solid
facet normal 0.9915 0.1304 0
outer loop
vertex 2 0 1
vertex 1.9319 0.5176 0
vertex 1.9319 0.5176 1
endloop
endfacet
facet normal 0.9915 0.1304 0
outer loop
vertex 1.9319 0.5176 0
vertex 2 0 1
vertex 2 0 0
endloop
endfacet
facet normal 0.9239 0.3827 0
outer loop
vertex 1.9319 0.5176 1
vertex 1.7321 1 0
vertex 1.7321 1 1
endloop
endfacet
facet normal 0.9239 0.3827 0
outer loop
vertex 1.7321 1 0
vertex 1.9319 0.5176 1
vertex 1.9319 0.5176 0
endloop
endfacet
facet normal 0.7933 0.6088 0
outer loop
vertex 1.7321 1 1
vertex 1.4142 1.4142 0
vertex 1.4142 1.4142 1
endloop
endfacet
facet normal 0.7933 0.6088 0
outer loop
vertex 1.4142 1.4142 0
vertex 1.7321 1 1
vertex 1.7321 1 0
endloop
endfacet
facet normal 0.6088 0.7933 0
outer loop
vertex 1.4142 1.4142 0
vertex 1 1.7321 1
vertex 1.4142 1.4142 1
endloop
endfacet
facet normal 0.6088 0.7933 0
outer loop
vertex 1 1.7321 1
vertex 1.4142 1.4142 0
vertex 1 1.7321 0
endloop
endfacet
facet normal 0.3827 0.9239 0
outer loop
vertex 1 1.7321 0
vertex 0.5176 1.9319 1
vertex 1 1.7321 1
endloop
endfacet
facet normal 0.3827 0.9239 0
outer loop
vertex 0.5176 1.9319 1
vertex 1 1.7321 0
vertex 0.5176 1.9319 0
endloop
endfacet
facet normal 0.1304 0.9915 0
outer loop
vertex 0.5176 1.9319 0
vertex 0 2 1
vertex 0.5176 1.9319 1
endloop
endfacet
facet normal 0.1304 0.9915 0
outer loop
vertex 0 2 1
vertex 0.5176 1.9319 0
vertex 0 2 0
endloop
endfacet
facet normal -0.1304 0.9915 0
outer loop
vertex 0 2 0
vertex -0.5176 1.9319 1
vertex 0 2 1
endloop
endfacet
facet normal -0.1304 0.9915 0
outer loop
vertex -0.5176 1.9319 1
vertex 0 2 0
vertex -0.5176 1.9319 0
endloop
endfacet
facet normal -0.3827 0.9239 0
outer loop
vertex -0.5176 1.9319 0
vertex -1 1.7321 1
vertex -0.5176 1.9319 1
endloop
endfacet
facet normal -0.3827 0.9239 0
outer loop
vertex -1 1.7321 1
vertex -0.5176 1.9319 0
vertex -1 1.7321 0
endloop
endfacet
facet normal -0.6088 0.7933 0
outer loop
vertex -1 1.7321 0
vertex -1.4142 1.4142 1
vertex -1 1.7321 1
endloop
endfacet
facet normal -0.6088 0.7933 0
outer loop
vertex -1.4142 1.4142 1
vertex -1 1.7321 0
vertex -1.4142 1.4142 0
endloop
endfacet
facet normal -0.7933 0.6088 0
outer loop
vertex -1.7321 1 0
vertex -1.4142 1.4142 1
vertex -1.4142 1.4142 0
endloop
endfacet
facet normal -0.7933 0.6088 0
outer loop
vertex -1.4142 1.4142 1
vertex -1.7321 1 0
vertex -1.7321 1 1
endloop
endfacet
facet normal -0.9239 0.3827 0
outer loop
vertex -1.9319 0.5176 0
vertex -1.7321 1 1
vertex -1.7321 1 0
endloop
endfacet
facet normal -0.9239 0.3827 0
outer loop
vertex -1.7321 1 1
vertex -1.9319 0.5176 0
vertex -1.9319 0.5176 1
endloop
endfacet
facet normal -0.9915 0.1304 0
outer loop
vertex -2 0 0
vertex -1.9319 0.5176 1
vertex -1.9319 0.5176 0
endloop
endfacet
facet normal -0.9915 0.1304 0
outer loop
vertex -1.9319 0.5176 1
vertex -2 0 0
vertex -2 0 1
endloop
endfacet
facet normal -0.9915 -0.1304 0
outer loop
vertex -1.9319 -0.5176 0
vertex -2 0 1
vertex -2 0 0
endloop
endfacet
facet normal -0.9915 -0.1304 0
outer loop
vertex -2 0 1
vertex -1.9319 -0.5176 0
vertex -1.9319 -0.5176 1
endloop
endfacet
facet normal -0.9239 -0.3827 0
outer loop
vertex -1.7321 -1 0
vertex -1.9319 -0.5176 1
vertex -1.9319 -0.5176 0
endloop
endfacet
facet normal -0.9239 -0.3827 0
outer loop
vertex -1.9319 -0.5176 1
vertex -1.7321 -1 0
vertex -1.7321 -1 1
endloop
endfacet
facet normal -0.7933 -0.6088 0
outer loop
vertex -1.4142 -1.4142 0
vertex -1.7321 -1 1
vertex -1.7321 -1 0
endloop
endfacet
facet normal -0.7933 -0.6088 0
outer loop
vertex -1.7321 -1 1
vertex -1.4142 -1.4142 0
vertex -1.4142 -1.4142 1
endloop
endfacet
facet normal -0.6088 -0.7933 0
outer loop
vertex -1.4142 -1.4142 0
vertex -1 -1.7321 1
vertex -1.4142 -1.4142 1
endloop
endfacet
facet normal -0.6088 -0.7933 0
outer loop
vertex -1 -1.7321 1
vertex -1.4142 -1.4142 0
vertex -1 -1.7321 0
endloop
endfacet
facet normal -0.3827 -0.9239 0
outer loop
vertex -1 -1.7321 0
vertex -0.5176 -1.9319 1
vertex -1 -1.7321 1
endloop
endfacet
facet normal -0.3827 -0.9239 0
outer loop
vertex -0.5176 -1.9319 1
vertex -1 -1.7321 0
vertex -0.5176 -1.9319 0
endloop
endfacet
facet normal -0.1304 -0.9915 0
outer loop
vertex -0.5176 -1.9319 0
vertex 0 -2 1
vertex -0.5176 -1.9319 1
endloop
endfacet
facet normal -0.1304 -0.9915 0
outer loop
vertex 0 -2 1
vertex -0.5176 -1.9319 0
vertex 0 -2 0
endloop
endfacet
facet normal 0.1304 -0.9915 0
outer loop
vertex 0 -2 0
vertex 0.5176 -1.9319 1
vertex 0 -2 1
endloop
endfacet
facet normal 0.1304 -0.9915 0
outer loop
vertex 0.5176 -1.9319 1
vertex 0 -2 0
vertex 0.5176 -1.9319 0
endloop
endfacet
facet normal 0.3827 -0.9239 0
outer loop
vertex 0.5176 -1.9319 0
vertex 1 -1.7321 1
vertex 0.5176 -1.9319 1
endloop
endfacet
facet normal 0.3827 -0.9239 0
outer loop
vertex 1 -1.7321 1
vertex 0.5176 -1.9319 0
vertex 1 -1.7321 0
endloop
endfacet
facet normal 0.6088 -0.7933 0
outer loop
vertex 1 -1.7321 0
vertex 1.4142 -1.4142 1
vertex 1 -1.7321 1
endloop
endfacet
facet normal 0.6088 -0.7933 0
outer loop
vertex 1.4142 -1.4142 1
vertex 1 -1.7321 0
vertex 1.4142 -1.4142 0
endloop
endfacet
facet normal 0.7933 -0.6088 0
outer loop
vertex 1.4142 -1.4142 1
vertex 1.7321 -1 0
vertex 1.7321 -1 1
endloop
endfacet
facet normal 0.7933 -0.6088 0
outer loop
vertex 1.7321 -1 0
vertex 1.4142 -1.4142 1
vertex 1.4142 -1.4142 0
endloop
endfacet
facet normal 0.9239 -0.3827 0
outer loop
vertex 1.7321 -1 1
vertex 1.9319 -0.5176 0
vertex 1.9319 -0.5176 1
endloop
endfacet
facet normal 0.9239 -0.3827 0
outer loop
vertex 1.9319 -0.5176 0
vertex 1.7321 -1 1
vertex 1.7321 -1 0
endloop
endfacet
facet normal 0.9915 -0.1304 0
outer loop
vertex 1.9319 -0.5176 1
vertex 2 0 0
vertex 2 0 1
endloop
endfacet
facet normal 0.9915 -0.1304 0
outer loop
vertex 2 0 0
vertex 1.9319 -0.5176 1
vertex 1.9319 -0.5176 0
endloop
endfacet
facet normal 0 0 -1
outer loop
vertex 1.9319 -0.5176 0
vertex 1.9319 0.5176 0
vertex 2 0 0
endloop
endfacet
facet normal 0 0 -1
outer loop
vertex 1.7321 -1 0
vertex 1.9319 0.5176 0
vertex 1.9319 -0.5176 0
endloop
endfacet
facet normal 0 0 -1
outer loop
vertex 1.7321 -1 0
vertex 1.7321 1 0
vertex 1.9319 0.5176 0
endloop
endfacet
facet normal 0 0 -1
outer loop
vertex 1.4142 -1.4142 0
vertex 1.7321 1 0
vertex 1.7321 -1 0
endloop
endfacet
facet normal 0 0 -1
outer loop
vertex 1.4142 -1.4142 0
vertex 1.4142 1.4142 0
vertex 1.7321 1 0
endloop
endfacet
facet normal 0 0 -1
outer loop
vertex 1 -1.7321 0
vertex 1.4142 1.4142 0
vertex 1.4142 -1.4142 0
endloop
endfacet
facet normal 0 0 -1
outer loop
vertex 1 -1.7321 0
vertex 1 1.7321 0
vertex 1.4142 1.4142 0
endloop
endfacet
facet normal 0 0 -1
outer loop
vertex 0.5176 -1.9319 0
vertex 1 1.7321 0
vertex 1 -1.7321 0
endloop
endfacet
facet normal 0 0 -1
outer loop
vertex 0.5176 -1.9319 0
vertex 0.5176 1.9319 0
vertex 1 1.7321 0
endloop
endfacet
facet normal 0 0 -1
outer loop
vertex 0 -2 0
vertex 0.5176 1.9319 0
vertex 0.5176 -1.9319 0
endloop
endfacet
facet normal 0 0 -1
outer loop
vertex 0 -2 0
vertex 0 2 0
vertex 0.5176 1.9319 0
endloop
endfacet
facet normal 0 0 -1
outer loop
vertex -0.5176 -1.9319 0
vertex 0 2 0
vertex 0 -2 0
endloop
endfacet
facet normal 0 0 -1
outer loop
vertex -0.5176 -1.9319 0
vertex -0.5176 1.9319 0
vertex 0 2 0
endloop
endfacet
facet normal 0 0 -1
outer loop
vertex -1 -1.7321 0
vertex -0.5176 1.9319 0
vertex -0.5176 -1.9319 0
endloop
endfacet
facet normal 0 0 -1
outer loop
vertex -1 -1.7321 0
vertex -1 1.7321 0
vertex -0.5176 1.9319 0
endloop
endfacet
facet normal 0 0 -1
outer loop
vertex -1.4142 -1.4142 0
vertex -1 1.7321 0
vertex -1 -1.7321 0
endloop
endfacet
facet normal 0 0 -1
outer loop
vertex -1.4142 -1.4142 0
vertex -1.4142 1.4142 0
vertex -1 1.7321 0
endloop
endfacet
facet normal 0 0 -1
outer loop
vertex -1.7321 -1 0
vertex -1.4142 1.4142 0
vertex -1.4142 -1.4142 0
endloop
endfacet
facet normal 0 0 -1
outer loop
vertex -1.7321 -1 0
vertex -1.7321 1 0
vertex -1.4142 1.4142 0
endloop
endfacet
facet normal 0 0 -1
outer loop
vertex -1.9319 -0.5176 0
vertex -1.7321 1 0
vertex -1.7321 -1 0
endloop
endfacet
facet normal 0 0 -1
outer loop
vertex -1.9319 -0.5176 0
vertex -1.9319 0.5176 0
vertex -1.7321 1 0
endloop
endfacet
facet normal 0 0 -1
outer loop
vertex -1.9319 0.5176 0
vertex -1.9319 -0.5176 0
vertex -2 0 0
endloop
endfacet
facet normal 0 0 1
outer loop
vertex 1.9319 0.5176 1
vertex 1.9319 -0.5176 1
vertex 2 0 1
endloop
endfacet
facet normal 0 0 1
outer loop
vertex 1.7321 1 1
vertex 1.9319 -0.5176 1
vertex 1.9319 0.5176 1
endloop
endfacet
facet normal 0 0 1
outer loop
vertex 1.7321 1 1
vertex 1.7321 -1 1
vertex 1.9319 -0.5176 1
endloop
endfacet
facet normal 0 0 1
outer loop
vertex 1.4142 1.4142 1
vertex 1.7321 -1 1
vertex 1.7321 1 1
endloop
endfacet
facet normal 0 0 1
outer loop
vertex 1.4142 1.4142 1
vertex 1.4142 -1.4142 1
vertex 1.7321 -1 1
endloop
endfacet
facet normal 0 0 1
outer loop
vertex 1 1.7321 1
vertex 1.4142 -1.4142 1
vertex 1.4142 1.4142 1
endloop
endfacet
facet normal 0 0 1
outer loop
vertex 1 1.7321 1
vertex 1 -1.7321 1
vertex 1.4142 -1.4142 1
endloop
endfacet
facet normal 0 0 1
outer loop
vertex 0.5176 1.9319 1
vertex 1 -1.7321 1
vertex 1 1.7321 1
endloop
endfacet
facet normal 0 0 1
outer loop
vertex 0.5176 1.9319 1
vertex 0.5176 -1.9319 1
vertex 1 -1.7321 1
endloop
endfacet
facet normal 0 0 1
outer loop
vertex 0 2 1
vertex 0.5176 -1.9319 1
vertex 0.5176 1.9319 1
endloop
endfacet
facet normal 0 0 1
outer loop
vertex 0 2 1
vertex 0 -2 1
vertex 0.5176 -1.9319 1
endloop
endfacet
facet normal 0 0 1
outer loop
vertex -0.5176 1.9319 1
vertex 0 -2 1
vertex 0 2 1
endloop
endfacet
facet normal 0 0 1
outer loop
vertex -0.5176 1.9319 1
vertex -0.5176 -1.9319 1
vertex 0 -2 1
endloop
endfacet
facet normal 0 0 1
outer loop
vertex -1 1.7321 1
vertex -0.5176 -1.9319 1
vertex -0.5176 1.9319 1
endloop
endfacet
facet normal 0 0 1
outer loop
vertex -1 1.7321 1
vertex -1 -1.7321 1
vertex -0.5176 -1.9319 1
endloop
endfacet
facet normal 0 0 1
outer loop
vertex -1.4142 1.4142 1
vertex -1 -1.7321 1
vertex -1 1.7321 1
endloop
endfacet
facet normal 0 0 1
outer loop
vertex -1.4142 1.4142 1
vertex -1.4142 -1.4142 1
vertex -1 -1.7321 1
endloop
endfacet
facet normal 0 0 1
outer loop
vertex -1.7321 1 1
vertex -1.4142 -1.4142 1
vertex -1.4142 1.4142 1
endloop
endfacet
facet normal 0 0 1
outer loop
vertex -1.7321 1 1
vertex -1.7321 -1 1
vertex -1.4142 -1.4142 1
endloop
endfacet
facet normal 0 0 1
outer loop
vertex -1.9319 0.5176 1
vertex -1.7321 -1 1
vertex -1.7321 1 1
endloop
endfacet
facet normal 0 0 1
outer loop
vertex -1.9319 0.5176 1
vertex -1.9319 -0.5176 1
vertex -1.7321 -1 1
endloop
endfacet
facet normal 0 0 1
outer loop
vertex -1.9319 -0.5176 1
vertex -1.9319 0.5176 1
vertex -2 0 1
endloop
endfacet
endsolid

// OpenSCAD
// A small library, pulled in by include.scad (`include`) and use.scad
// (`use`). Run on its own it renders its demo peg.

// File-scope variable: visible to this file's functions and modules even
// when the file is `use`d, but never to the file that uses it.
peg_radius = 2;

function peg_double(x) = x * 2;
function peg_default_radius() = peg_radius;

module peg(h = 4, r = peg_radius) cylinder(h = h, r = r, $fn = 24);

// Demo geometry: part of the model when this file is included or run
// directly, never when it is used.
peg(1);
